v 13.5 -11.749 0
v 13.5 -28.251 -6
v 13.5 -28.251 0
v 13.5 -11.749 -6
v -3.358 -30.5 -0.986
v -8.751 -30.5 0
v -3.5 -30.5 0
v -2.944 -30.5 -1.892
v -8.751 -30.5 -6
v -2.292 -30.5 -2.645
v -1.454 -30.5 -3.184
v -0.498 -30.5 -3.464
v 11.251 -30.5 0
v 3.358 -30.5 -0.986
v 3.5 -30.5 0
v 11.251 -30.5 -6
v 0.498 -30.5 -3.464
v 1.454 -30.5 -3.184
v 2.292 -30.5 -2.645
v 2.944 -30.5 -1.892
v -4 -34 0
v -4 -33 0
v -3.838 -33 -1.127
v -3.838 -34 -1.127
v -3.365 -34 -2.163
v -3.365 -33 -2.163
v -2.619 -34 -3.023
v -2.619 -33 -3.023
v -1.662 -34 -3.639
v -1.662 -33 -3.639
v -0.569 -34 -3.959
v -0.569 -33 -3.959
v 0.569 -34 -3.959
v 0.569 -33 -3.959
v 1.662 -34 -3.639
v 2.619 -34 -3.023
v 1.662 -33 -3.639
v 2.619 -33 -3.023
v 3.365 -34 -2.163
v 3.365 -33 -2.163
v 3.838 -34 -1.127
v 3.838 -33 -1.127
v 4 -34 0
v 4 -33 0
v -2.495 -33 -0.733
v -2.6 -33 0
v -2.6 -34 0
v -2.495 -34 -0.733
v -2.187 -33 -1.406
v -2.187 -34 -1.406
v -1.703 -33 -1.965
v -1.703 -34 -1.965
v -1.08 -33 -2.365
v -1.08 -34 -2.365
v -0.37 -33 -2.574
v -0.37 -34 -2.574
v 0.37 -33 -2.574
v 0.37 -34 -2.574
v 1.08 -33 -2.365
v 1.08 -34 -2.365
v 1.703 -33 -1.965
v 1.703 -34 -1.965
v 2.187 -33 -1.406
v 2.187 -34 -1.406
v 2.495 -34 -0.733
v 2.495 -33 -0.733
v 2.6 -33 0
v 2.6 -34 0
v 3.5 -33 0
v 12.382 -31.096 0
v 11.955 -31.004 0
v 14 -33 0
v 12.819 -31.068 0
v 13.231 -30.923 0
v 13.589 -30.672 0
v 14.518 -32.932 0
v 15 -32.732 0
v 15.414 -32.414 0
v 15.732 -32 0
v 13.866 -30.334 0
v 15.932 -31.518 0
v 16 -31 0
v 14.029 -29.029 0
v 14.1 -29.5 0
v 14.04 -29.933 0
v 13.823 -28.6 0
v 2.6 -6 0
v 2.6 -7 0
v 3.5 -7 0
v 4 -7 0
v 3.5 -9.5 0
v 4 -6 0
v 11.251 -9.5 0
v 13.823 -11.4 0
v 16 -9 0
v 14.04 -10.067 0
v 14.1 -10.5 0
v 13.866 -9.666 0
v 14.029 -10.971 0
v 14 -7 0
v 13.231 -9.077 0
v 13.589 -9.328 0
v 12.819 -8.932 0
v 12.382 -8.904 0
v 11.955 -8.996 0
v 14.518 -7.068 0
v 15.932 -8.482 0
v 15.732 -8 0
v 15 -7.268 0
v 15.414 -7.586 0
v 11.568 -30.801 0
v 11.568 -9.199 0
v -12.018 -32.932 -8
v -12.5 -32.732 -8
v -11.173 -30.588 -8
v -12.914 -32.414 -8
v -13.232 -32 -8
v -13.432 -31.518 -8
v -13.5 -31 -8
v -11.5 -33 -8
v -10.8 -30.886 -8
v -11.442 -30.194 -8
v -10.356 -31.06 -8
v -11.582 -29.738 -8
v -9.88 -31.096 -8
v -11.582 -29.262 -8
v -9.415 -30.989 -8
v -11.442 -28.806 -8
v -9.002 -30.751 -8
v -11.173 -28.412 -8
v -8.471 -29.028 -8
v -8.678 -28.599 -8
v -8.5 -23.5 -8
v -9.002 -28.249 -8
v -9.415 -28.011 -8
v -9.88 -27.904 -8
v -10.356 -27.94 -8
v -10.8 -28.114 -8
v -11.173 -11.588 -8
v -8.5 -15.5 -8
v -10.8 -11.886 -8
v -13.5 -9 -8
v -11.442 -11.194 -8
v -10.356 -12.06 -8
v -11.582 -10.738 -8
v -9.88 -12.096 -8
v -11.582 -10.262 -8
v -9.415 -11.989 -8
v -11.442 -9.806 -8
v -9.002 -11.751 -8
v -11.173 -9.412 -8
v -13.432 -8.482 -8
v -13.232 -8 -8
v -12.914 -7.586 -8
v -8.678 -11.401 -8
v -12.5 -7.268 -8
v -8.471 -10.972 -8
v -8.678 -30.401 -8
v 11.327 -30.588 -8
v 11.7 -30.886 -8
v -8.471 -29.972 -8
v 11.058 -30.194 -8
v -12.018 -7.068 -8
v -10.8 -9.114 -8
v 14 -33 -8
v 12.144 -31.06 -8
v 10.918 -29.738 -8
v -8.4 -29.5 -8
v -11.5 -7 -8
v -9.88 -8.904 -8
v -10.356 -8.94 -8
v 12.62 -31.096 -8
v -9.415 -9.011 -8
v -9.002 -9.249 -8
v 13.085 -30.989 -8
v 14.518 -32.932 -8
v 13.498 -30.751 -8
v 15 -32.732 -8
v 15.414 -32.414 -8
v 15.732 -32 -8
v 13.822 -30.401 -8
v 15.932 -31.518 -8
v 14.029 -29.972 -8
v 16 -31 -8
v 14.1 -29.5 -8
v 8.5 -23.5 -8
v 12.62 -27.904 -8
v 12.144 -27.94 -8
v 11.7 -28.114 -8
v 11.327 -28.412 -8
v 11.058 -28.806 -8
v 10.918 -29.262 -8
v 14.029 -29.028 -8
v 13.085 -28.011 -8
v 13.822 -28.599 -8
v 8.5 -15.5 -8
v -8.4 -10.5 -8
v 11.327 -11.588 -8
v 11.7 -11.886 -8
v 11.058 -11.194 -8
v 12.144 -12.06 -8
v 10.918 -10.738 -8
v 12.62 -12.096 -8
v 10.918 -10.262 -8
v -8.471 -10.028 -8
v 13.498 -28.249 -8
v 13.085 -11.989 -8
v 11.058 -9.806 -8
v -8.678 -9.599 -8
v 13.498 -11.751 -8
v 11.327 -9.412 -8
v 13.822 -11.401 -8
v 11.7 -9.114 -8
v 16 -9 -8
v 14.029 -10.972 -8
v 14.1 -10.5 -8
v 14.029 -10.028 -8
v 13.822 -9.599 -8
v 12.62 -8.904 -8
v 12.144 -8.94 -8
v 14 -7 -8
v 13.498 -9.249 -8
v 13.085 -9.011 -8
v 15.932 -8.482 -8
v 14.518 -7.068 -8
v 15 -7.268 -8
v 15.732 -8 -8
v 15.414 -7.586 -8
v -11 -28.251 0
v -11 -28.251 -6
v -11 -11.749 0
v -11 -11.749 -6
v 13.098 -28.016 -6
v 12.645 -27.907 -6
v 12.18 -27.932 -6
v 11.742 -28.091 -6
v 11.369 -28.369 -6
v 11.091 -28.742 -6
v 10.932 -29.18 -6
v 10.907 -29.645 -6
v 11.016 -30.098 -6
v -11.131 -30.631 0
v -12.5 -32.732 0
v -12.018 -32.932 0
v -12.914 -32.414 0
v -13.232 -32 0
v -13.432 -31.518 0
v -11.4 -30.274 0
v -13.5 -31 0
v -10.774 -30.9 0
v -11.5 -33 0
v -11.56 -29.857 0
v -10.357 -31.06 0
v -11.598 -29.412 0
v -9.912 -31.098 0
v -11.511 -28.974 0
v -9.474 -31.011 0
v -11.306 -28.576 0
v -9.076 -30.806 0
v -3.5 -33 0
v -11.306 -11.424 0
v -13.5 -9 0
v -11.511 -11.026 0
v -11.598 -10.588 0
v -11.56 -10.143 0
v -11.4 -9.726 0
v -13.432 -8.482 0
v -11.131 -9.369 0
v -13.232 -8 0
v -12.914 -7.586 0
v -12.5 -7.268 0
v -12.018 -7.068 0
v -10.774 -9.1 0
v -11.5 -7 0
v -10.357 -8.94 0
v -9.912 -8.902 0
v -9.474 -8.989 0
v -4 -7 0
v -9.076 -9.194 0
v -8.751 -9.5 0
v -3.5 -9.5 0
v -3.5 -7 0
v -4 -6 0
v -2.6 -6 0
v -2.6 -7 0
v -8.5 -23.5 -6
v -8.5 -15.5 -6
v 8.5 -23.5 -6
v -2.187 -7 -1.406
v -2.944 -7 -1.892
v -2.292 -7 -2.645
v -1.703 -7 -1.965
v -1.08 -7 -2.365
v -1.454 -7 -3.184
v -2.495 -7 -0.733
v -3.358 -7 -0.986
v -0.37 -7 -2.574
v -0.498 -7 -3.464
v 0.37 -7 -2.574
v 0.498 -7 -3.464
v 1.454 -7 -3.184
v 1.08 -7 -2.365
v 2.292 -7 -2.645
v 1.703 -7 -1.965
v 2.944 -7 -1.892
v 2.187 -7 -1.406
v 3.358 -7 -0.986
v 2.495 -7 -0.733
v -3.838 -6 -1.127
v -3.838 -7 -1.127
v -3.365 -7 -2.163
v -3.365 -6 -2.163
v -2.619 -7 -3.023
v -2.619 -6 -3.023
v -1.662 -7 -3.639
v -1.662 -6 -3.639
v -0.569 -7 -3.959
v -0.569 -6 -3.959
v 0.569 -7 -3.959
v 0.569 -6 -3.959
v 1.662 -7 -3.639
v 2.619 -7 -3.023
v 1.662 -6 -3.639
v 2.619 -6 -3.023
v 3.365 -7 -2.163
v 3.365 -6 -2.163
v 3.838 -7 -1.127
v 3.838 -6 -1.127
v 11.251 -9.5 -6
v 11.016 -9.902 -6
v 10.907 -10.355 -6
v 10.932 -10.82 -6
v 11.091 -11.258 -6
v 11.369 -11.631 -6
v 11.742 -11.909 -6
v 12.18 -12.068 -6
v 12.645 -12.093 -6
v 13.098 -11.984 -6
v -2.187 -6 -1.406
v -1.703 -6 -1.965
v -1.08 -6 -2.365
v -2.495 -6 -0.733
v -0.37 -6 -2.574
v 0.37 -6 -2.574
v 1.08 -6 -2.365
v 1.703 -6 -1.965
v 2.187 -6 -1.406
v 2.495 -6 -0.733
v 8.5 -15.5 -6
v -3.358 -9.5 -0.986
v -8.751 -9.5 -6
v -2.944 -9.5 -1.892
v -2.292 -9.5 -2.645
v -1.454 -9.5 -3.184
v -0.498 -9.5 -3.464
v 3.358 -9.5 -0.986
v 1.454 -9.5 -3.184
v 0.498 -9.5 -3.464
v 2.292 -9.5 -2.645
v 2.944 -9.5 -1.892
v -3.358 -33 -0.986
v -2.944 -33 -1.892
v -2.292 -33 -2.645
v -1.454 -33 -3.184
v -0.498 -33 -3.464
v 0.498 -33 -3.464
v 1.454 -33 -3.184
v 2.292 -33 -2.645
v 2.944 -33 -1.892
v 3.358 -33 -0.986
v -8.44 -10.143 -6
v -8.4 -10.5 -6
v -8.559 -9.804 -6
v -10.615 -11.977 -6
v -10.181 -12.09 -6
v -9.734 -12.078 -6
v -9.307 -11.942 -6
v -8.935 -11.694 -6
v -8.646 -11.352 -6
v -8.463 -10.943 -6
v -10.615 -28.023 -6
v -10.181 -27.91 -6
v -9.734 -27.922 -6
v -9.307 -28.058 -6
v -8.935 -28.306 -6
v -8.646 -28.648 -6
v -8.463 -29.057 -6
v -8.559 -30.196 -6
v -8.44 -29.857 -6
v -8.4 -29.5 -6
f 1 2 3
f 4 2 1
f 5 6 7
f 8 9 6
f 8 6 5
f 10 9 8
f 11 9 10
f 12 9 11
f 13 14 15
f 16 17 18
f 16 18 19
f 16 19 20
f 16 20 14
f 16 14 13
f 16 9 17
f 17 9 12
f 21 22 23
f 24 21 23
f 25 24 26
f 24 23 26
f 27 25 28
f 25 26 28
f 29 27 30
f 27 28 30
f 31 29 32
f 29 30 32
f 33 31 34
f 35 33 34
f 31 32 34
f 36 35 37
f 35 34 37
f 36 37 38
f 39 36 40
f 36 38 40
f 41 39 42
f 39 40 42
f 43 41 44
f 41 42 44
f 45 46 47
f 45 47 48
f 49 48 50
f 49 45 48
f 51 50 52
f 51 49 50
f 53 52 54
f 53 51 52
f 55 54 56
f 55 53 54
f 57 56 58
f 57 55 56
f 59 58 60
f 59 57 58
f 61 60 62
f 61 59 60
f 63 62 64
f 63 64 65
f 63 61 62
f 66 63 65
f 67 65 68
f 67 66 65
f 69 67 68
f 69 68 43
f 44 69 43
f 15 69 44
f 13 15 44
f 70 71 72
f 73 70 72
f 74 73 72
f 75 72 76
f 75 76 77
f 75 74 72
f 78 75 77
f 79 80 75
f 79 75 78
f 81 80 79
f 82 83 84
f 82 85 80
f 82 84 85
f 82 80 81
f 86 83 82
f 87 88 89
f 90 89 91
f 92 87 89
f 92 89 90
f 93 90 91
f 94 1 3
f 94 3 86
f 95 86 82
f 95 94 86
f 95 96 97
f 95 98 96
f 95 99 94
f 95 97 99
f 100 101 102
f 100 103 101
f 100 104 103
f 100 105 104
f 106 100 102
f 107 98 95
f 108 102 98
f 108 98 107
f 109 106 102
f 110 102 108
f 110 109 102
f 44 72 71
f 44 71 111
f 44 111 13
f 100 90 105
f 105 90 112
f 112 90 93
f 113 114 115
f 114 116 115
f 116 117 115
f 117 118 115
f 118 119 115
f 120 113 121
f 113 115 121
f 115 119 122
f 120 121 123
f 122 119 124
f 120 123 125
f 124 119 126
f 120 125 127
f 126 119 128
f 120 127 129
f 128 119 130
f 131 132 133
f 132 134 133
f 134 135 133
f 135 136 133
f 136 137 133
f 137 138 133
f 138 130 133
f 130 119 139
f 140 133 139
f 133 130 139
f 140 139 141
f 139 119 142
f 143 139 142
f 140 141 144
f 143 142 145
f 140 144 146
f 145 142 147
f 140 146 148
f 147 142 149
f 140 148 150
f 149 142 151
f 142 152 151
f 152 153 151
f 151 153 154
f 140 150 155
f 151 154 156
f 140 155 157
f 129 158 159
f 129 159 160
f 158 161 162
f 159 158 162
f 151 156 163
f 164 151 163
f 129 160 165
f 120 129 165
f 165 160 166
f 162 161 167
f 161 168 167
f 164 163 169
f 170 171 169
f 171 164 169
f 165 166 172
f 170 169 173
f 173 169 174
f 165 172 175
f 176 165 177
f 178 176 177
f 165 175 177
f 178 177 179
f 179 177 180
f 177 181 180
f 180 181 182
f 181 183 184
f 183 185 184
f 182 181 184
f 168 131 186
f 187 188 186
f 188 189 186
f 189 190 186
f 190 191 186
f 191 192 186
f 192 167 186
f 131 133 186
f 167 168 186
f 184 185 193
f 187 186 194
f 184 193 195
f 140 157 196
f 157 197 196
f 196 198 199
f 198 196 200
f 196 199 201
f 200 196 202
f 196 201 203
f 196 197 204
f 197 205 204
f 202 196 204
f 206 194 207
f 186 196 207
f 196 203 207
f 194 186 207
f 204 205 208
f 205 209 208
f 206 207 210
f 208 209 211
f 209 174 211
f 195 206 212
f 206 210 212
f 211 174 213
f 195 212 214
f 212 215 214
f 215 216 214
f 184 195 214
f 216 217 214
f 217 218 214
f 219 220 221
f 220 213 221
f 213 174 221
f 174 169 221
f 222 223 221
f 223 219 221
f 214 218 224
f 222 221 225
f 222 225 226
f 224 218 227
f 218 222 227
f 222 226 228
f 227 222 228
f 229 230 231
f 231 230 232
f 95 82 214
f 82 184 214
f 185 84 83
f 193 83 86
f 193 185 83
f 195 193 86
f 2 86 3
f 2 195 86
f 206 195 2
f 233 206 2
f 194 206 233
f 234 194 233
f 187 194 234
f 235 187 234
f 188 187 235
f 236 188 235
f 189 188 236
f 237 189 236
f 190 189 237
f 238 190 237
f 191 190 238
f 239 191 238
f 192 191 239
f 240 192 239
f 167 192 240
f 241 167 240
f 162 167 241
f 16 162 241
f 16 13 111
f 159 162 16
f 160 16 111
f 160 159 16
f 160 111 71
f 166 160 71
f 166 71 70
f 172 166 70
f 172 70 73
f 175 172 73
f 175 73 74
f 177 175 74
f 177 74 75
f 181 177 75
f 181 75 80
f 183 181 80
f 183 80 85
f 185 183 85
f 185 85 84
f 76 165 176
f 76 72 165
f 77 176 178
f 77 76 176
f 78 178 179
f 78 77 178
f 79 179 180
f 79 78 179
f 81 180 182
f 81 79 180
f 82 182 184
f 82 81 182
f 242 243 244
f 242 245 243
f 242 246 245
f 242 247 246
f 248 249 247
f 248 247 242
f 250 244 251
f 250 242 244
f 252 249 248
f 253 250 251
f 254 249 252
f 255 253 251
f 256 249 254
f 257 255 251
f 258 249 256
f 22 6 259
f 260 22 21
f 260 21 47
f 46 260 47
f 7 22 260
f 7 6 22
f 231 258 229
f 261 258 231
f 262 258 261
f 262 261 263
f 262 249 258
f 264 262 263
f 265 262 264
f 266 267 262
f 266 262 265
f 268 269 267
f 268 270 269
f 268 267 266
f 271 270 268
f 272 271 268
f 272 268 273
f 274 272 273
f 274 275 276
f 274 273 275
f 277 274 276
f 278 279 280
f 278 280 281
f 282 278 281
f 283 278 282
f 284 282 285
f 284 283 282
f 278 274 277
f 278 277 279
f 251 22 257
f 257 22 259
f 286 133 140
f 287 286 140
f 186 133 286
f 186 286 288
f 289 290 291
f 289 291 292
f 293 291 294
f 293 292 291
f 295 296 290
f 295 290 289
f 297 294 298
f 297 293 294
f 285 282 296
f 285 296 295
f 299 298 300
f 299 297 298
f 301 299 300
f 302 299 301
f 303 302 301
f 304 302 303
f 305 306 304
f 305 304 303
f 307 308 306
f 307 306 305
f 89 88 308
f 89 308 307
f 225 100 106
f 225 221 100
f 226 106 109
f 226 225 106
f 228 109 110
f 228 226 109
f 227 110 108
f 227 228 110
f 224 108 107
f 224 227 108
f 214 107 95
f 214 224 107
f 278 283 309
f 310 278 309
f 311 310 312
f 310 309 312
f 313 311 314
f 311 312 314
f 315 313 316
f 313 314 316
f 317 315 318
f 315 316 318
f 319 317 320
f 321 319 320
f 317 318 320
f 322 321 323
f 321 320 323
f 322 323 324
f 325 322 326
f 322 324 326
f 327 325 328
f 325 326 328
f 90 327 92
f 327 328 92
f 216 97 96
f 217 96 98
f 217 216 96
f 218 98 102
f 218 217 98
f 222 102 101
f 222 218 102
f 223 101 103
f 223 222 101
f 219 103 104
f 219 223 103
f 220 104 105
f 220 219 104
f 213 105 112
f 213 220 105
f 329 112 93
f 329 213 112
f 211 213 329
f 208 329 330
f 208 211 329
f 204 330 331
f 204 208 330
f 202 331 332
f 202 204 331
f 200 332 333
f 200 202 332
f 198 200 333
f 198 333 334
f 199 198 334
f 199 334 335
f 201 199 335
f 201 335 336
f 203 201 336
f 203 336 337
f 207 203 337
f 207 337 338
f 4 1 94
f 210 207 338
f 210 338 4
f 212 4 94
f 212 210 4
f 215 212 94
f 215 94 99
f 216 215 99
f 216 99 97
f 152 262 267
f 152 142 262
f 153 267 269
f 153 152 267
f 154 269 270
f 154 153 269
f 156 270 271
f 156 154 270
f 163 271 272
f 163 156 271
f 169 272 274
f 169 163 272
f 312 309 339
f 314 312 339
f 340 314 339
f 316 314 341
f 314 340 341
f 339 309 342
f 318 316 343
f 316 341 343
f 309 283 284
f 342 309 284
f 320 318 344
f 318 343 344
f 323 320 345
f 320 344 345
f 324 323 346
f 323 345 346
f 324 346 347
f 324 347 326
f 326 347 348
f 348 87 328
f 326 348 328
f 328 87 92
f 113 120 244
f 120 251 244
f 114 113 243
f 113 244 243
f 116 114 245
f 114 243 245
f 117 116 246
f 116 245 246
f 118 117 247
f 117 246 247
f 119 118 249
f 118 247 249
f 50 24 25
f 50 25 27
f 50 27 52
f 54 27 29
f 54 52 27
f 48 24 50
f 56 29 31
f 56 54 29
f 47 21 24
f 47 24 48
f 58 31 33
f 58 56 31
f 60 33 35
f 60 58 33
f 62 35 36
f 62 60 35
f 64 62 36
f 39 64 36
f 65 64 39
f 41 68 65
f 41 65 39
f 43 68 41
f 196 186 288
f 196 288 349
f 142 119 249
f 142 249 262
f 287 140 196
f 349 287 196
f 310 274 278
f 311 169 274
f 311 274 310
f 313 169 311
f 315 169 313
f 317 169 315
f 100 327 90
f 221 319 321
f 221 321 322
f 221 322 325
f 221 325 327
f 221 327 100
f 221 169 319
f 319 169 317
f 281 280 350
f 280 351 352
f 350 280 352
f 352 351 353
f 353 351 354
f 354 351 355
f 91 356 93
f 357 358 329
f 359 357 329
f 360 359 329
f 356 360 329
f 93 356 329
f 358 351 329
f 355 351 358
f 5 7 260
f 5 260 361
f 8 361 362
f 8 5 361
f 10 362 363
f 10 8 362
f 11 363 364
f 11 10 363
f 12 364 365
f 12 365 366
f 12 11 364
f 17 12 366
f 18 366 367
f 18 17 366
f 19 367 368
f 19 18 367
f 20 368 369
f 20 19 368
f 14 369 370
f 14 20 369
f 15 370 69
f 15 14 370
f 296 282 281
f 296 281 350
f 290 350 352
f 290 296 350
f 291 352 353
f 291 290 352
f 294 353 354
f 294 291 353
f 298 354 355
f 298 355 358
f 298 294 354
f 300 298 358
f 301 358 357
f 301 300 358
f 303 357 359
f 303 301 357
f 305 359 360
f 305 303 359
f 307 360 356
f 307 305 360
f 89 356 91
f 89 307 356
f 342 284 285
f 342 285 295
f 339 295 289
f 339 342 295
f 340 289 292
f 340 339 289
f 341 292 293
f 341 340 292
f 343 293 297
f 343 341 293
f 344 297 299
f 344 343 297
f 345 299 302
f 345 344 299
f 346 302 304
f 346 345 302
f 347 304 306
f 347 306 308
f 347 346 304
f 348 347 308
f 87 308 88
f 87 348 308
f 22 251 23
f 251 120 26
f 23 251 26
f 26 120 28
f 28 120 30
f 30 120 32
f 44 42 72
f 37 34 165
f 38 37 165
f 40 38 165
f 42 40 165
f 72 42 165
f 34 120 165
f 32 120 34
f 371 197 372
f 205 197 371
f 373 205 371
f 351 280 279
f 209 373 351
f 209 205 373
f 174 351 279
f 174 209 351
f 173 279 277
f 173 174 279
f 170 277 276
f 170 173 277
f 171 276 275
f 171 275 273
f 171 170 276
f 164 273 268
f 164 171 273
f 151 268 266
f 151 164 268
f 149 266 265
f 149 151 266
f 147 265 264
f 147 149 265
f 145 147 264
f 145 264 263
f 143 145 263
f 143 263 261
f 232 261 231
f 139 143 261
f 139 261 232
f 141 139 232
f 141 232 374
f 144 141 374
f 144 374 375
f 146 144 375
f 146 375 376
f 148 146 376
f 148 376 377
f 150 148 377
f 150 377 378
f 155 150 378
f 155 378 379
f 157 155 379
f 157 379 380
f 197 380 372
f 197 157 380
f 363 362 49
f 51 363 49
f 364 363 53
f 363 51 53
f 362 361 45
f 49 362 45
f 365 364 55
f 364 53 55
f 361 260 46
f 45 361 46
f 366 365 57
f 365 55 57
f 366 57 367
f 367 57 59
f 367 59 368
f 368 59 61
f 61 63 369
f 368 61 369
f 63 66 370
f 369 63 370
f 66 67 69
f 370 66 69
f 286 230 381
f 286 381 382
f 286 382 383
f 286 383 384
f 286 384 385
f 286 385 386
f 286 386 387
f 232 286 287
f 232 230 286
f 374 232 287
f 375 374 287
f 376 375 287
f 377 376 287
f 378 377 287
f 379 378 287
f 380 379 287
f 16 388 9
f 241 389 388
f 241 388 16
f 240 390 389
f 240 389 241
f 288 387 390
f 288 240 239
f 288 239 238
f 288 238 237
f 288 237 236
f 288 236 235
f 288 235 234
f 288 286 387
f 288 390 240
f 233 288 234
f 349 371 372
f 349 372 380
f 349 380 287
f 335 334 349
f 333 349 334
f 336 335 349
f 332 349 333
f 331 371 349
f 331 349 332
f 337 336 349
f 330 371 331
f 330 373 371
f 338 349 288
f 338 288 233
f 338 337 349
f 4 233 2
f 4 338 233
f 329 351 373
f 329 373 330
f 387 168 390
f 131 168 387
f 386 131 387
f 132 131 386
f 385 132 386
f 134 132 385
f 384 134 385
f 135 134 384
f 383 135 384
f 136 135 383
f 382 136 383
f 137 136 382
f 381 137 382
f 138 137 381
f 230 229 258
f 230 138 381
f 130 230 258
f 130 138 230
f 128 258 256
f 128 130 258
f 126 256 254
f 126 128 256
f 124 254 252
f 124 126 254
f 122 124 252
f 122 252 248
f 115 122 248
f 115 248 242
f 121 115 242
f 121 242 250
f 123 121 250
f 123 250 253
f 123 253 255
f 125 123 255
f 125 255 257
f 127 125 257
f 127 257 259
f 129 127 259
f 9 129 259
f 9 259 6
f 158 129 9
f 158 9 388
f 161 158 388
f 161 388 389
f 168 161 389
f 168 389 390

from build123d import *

# Parameters (mm, degrees)
BOX_W             = 8
BOX_H             = 1
BOX_DEPTH         = 4
TUBE016_R         = 4
TUBE016_R_2       = 2.6
TUBE016_DEPTH     = 1
BOX067_W          = 8
BOX067_H          = 1
BOX067_DEPTH      = 4
TUBE019_R         = 4
TUBE019_R_2       = 2.6
TUBE019_DEPTH     = 1
BOX051_W          = 17
BOX051_H          = 8
BOX051_DEPTH      = 2
CYLINDER093_R     = 1.6
CYLINDER093_DEPTH = 8
CYLINDER094_R     = 1.6
CYLINDER094_DEPTH = 8
CYLINDER095_R     = 1.6
CYLINDER095_DEPTH = 8
CYLINDER092_R     = 1.6
CYLINDER092_DEPTH = 8
CYLINDER084_R     = 3.5
CYLINDER084_DEPTH = 2.5
BOX033_W          = 29.5
BOX033_H          = 2.5
BOX033_DEPTH      = 6
CYLINDER082_R     = 3.5
CYLINDER082_DEPTH = 2.5
BOX021_W          = 29.5
BOX021_H          = 2.5
BOX021_DEPTH      = 6
BOX022_W          = 29.5
BOX022_H          = 26
BOX022_DEPTH      = 2
BOX029_W          = 2.5
BOX029_H          = 21
BOX029_DEPTH      = 6
BOX036_W          = 2.5
BOX036_H          = 21
BOX036_DEPTH      = 6
FILLET006_R       = 2
FILLET007_R       = 2


with BuildPart() as cube:
    # Box → Box (new body)
    with BuildSketch(Plane(origin=(-4, -7, 0), x_dir=(1, 0, 0), z_dir=(0, 0, 1))):
        with Locations((4, 0.5)):
            Rectangle(BOX_W, BOX_H)
    extrude(amount=BOX_DEPTH)


with BuildPart() as cut068:
    # Tube016 → Tube016 (new body)
    with BuildSketch(Plane.XZ.offset(6)):
        Circle(TUBE016_R)
        Circle(TUBE016_R_2, mode=Mode.SUBTRACT)
    extrude(amount=TUBE016_DEPTH)

    # Cut068: cut Cube
    add(cube.part, mode=Mode.SUBTRACT)


with BuildPart() as cube067:
    # Box067 → Box067 (new body)
    with BuildSketch(Plane(origin=(-4, -34, 0), x_dir=(1, 0, 0), z_dir=(0, 0, 1))):
        with Locations((4, 0.5)):
            Rectangle(BOX067_W, BOX067_H)
    extrude(amount=BOX067_DEPTH)


with BuildPart() as cut071:
    # Tube019 → Tube019 (new body)
    with BuildSketch(Plane.XZ.offset(33)):
        Circle(TUBE019_R)
        Circle(TUBE019_R_2, mode=Mode.SUBTRACT)
    extrude(amount=TUBE019_DEPTH)

    # Cut071: cut Cube067
    add(cube067.part, mode=Mode.SUBTRACT)


with BuildPart() as cube051:
    # Box051 → Box051 (new body)
    with BuildSketch(Plane(origin=(-8.5, -49, -8), x_dir=(1, 0, 0), z_dir=(0, 0, 1))):
        with Locations((8.5, 4)):
            Rectangle(BOX051_W, BOX051_H)
    extrude(amount=BOX051_DEPTH)


with BuildPart() as cylinder093:
    # Cylinder093 → Cylinder093 (new body)
    with BuildSketch(Plane(origin=(-10, -55, 0), x_dir=(1, 0, 0), z_dir=(0, 0, 1))):
        Circle(CYLINDER093_R)
    extrude(amount=CYLINDER093_DEPTH)


with BuildPart() as cylinder094:
    # Cylinder094 → Cylinder094 (new body)
    with BuildSketch(Plane(origin=(12.5, -36, 0), x_dir=(1, 0, 0), z_dir=(0, 0, 1))):
        Circle(CYLINDER094_R)
    extrude(amount=CYLINDER094_DEPTH)


with BuildPart() as cylinder095:
    # Cylinder095 → Cylinder095 (new body)
    with BuildSketch(Plane(origin=(12.5, -55, 0), x_dir=(1, 0, 0), z_dir=(0, 0, 1))):
        Circle(CYLINDER095_R)
    extrude(amount=CYLINDER095_DEPTH)


with BuildPart() as fusion059:
    # Cylinder092 → Cylinder092 (new body)
    with BuildSketch(Plane(origin=(-10, -36, 0), x_dir=(1, 0, 0), z_dir=(0, 0, 1))):
        Circle(CYLINDER092_R)
    extrude(amount=CYLINDER092_DEPTH)

    # Fusion058: union Cylinder093, Cylinder094, Cylinder095
    add(cylinder093.part)
    add(cylinder094.part)
    add(cylinder095.part)


with BuildPart() as fusion059_1:
    # Fusion058 placement: moved
    add(fusion059.part.moved(Location((0, 0, -8))))

    # Fusion059: union Cube051
    add(cube051.part)


with BuildPart() as cylinder084:
    # Cylinder084 → Cylinder084 (new body)
    with BuildSketch(Plane.XZ.offset(55.5)):
        Circle(CYLINDER084_R)
    extrude(amount=CYLINDER084_DEPTH)


with BuildPart() as cut038:
    # Box033 → Box033 (new body)
    with BuildSketch(Plane(origin=(-13.5, -58, -6), x_dir=(1, 0, 0), z_dir=(0, 0, 1))):
        with Locations((14.75, 1.25)):
            Rectangle(BOX033_W, BOX033_H)
    extrude(amount=BOX033_DEPTH)

    # Cut038: cut Cylinder084
    add(cylinder084.part, mode=Mode.SUBTRACT)


with BuildPart() as cut038_1:
    # Cut038 placement: moved
    add(cut038.part.moved(Location((0, 23, 0))))


with BuildPart() as cylinder082:
    # Cylinder082 → Cylinder082 (new body)
    with BuildSketch(Plane.XZ.offset(55.5)):
        Circle(CYLINDER082_R)
    extrude(amount=CYLINDER082_DEPTH)


with BuildPart() as cut036:
    # Box021 → Box021 (new body)
    with BuildSketch(Plane(origin=(-13.5, -58, -6), x_dir=(1, 0, 0), z_dir=(0, 0, 1))):
        with Locations((14.75, 1.25)):
            Rectangle(BOX021_W, BOX021_H)
    extrude(amount=BOX021_DEPTH)

    # Cut036: cut Cylinder082
    add(cylinder082.part, mode=Mode.SUBTRACT)


with BuildPart() as cut036_1:
    # Cut036 placement: moved
    add(cut036.part.moved(Location((0, -0.5, 0))))


with BuildPart() as cube022:
    # Box022 → Box022 (new body)
    with BuildSketch(Plane(origin=(-13.5, -58.5, -8), x_dir=(1, 0, 0), z_dir=(0, 0, 1))):
        with Locations((14.75, 13)):
            Rectangle(BOX022_W, BOX022_H)
    extrude(amount=BOX022_DEPTH)


with BuildPart() as cube029:
    # Box029 → Box029 (new body)
    with BuildSketch(Plane(origin=(-13.5, -56, -6), x_dir=(1, 0, 0), z_dir=(0, 0, 1))):
        with Locations((1.25, 10.5)):
            Rectangle(BOX029_W, BOX029_H)
    extrude(amount=BOX029_DEPTH)


with BuildPart() as fillet007:
    # Box036 → Box036 (new body)
    with BuildSketch(Plane(origin=(13.5, -56, -6), x_dir=(1, 0, 0), z_dir=(0, 0, 1))):
        with Locations((1.25, 10.5)):
            Rectangle(BOX036_W, BOX036_H)
    extrude(amount=BOX036_DEPTH)

    # Fusion062: union Cut038, Cut036, Cube022, Cube029
    add(cut038_1.part)
    add(cut036_1.part)
    add(cube022.part)
    add(cube029.part)

    # Cut056: cut Fusion059
    add(fusion059_1.part, mode=Mode.SUBTRACT)


with BuildPart() as fillet007_1:
    # Cut056 placement: moved
    add(fillet007.part.moved(Location((0, 25.5, 0))))

    # Fusion084: union Cut068, Cut071
    add(cut068.part)
    add(cut071.part)

    # Fillet006
    fillet006_edges = [fillet007_1.edges().sort_by_distance(p)[0] for p in [
        (-13.5, -7, -3),
        (-13.5, -33, -3),
    ]]
    fillet(fillet006_edges, radius=FILLET006_R)

    # Fillet007
    fillet007_edges = [fillet007_1.edges().sort_by_distance(p)[0] for p in [
        (16, -33, -3),
        (16, -7, -3),
    ]]
    fillet(fillet007_edges, radius=FILLET007_R)


solid = fillet007_1.part
